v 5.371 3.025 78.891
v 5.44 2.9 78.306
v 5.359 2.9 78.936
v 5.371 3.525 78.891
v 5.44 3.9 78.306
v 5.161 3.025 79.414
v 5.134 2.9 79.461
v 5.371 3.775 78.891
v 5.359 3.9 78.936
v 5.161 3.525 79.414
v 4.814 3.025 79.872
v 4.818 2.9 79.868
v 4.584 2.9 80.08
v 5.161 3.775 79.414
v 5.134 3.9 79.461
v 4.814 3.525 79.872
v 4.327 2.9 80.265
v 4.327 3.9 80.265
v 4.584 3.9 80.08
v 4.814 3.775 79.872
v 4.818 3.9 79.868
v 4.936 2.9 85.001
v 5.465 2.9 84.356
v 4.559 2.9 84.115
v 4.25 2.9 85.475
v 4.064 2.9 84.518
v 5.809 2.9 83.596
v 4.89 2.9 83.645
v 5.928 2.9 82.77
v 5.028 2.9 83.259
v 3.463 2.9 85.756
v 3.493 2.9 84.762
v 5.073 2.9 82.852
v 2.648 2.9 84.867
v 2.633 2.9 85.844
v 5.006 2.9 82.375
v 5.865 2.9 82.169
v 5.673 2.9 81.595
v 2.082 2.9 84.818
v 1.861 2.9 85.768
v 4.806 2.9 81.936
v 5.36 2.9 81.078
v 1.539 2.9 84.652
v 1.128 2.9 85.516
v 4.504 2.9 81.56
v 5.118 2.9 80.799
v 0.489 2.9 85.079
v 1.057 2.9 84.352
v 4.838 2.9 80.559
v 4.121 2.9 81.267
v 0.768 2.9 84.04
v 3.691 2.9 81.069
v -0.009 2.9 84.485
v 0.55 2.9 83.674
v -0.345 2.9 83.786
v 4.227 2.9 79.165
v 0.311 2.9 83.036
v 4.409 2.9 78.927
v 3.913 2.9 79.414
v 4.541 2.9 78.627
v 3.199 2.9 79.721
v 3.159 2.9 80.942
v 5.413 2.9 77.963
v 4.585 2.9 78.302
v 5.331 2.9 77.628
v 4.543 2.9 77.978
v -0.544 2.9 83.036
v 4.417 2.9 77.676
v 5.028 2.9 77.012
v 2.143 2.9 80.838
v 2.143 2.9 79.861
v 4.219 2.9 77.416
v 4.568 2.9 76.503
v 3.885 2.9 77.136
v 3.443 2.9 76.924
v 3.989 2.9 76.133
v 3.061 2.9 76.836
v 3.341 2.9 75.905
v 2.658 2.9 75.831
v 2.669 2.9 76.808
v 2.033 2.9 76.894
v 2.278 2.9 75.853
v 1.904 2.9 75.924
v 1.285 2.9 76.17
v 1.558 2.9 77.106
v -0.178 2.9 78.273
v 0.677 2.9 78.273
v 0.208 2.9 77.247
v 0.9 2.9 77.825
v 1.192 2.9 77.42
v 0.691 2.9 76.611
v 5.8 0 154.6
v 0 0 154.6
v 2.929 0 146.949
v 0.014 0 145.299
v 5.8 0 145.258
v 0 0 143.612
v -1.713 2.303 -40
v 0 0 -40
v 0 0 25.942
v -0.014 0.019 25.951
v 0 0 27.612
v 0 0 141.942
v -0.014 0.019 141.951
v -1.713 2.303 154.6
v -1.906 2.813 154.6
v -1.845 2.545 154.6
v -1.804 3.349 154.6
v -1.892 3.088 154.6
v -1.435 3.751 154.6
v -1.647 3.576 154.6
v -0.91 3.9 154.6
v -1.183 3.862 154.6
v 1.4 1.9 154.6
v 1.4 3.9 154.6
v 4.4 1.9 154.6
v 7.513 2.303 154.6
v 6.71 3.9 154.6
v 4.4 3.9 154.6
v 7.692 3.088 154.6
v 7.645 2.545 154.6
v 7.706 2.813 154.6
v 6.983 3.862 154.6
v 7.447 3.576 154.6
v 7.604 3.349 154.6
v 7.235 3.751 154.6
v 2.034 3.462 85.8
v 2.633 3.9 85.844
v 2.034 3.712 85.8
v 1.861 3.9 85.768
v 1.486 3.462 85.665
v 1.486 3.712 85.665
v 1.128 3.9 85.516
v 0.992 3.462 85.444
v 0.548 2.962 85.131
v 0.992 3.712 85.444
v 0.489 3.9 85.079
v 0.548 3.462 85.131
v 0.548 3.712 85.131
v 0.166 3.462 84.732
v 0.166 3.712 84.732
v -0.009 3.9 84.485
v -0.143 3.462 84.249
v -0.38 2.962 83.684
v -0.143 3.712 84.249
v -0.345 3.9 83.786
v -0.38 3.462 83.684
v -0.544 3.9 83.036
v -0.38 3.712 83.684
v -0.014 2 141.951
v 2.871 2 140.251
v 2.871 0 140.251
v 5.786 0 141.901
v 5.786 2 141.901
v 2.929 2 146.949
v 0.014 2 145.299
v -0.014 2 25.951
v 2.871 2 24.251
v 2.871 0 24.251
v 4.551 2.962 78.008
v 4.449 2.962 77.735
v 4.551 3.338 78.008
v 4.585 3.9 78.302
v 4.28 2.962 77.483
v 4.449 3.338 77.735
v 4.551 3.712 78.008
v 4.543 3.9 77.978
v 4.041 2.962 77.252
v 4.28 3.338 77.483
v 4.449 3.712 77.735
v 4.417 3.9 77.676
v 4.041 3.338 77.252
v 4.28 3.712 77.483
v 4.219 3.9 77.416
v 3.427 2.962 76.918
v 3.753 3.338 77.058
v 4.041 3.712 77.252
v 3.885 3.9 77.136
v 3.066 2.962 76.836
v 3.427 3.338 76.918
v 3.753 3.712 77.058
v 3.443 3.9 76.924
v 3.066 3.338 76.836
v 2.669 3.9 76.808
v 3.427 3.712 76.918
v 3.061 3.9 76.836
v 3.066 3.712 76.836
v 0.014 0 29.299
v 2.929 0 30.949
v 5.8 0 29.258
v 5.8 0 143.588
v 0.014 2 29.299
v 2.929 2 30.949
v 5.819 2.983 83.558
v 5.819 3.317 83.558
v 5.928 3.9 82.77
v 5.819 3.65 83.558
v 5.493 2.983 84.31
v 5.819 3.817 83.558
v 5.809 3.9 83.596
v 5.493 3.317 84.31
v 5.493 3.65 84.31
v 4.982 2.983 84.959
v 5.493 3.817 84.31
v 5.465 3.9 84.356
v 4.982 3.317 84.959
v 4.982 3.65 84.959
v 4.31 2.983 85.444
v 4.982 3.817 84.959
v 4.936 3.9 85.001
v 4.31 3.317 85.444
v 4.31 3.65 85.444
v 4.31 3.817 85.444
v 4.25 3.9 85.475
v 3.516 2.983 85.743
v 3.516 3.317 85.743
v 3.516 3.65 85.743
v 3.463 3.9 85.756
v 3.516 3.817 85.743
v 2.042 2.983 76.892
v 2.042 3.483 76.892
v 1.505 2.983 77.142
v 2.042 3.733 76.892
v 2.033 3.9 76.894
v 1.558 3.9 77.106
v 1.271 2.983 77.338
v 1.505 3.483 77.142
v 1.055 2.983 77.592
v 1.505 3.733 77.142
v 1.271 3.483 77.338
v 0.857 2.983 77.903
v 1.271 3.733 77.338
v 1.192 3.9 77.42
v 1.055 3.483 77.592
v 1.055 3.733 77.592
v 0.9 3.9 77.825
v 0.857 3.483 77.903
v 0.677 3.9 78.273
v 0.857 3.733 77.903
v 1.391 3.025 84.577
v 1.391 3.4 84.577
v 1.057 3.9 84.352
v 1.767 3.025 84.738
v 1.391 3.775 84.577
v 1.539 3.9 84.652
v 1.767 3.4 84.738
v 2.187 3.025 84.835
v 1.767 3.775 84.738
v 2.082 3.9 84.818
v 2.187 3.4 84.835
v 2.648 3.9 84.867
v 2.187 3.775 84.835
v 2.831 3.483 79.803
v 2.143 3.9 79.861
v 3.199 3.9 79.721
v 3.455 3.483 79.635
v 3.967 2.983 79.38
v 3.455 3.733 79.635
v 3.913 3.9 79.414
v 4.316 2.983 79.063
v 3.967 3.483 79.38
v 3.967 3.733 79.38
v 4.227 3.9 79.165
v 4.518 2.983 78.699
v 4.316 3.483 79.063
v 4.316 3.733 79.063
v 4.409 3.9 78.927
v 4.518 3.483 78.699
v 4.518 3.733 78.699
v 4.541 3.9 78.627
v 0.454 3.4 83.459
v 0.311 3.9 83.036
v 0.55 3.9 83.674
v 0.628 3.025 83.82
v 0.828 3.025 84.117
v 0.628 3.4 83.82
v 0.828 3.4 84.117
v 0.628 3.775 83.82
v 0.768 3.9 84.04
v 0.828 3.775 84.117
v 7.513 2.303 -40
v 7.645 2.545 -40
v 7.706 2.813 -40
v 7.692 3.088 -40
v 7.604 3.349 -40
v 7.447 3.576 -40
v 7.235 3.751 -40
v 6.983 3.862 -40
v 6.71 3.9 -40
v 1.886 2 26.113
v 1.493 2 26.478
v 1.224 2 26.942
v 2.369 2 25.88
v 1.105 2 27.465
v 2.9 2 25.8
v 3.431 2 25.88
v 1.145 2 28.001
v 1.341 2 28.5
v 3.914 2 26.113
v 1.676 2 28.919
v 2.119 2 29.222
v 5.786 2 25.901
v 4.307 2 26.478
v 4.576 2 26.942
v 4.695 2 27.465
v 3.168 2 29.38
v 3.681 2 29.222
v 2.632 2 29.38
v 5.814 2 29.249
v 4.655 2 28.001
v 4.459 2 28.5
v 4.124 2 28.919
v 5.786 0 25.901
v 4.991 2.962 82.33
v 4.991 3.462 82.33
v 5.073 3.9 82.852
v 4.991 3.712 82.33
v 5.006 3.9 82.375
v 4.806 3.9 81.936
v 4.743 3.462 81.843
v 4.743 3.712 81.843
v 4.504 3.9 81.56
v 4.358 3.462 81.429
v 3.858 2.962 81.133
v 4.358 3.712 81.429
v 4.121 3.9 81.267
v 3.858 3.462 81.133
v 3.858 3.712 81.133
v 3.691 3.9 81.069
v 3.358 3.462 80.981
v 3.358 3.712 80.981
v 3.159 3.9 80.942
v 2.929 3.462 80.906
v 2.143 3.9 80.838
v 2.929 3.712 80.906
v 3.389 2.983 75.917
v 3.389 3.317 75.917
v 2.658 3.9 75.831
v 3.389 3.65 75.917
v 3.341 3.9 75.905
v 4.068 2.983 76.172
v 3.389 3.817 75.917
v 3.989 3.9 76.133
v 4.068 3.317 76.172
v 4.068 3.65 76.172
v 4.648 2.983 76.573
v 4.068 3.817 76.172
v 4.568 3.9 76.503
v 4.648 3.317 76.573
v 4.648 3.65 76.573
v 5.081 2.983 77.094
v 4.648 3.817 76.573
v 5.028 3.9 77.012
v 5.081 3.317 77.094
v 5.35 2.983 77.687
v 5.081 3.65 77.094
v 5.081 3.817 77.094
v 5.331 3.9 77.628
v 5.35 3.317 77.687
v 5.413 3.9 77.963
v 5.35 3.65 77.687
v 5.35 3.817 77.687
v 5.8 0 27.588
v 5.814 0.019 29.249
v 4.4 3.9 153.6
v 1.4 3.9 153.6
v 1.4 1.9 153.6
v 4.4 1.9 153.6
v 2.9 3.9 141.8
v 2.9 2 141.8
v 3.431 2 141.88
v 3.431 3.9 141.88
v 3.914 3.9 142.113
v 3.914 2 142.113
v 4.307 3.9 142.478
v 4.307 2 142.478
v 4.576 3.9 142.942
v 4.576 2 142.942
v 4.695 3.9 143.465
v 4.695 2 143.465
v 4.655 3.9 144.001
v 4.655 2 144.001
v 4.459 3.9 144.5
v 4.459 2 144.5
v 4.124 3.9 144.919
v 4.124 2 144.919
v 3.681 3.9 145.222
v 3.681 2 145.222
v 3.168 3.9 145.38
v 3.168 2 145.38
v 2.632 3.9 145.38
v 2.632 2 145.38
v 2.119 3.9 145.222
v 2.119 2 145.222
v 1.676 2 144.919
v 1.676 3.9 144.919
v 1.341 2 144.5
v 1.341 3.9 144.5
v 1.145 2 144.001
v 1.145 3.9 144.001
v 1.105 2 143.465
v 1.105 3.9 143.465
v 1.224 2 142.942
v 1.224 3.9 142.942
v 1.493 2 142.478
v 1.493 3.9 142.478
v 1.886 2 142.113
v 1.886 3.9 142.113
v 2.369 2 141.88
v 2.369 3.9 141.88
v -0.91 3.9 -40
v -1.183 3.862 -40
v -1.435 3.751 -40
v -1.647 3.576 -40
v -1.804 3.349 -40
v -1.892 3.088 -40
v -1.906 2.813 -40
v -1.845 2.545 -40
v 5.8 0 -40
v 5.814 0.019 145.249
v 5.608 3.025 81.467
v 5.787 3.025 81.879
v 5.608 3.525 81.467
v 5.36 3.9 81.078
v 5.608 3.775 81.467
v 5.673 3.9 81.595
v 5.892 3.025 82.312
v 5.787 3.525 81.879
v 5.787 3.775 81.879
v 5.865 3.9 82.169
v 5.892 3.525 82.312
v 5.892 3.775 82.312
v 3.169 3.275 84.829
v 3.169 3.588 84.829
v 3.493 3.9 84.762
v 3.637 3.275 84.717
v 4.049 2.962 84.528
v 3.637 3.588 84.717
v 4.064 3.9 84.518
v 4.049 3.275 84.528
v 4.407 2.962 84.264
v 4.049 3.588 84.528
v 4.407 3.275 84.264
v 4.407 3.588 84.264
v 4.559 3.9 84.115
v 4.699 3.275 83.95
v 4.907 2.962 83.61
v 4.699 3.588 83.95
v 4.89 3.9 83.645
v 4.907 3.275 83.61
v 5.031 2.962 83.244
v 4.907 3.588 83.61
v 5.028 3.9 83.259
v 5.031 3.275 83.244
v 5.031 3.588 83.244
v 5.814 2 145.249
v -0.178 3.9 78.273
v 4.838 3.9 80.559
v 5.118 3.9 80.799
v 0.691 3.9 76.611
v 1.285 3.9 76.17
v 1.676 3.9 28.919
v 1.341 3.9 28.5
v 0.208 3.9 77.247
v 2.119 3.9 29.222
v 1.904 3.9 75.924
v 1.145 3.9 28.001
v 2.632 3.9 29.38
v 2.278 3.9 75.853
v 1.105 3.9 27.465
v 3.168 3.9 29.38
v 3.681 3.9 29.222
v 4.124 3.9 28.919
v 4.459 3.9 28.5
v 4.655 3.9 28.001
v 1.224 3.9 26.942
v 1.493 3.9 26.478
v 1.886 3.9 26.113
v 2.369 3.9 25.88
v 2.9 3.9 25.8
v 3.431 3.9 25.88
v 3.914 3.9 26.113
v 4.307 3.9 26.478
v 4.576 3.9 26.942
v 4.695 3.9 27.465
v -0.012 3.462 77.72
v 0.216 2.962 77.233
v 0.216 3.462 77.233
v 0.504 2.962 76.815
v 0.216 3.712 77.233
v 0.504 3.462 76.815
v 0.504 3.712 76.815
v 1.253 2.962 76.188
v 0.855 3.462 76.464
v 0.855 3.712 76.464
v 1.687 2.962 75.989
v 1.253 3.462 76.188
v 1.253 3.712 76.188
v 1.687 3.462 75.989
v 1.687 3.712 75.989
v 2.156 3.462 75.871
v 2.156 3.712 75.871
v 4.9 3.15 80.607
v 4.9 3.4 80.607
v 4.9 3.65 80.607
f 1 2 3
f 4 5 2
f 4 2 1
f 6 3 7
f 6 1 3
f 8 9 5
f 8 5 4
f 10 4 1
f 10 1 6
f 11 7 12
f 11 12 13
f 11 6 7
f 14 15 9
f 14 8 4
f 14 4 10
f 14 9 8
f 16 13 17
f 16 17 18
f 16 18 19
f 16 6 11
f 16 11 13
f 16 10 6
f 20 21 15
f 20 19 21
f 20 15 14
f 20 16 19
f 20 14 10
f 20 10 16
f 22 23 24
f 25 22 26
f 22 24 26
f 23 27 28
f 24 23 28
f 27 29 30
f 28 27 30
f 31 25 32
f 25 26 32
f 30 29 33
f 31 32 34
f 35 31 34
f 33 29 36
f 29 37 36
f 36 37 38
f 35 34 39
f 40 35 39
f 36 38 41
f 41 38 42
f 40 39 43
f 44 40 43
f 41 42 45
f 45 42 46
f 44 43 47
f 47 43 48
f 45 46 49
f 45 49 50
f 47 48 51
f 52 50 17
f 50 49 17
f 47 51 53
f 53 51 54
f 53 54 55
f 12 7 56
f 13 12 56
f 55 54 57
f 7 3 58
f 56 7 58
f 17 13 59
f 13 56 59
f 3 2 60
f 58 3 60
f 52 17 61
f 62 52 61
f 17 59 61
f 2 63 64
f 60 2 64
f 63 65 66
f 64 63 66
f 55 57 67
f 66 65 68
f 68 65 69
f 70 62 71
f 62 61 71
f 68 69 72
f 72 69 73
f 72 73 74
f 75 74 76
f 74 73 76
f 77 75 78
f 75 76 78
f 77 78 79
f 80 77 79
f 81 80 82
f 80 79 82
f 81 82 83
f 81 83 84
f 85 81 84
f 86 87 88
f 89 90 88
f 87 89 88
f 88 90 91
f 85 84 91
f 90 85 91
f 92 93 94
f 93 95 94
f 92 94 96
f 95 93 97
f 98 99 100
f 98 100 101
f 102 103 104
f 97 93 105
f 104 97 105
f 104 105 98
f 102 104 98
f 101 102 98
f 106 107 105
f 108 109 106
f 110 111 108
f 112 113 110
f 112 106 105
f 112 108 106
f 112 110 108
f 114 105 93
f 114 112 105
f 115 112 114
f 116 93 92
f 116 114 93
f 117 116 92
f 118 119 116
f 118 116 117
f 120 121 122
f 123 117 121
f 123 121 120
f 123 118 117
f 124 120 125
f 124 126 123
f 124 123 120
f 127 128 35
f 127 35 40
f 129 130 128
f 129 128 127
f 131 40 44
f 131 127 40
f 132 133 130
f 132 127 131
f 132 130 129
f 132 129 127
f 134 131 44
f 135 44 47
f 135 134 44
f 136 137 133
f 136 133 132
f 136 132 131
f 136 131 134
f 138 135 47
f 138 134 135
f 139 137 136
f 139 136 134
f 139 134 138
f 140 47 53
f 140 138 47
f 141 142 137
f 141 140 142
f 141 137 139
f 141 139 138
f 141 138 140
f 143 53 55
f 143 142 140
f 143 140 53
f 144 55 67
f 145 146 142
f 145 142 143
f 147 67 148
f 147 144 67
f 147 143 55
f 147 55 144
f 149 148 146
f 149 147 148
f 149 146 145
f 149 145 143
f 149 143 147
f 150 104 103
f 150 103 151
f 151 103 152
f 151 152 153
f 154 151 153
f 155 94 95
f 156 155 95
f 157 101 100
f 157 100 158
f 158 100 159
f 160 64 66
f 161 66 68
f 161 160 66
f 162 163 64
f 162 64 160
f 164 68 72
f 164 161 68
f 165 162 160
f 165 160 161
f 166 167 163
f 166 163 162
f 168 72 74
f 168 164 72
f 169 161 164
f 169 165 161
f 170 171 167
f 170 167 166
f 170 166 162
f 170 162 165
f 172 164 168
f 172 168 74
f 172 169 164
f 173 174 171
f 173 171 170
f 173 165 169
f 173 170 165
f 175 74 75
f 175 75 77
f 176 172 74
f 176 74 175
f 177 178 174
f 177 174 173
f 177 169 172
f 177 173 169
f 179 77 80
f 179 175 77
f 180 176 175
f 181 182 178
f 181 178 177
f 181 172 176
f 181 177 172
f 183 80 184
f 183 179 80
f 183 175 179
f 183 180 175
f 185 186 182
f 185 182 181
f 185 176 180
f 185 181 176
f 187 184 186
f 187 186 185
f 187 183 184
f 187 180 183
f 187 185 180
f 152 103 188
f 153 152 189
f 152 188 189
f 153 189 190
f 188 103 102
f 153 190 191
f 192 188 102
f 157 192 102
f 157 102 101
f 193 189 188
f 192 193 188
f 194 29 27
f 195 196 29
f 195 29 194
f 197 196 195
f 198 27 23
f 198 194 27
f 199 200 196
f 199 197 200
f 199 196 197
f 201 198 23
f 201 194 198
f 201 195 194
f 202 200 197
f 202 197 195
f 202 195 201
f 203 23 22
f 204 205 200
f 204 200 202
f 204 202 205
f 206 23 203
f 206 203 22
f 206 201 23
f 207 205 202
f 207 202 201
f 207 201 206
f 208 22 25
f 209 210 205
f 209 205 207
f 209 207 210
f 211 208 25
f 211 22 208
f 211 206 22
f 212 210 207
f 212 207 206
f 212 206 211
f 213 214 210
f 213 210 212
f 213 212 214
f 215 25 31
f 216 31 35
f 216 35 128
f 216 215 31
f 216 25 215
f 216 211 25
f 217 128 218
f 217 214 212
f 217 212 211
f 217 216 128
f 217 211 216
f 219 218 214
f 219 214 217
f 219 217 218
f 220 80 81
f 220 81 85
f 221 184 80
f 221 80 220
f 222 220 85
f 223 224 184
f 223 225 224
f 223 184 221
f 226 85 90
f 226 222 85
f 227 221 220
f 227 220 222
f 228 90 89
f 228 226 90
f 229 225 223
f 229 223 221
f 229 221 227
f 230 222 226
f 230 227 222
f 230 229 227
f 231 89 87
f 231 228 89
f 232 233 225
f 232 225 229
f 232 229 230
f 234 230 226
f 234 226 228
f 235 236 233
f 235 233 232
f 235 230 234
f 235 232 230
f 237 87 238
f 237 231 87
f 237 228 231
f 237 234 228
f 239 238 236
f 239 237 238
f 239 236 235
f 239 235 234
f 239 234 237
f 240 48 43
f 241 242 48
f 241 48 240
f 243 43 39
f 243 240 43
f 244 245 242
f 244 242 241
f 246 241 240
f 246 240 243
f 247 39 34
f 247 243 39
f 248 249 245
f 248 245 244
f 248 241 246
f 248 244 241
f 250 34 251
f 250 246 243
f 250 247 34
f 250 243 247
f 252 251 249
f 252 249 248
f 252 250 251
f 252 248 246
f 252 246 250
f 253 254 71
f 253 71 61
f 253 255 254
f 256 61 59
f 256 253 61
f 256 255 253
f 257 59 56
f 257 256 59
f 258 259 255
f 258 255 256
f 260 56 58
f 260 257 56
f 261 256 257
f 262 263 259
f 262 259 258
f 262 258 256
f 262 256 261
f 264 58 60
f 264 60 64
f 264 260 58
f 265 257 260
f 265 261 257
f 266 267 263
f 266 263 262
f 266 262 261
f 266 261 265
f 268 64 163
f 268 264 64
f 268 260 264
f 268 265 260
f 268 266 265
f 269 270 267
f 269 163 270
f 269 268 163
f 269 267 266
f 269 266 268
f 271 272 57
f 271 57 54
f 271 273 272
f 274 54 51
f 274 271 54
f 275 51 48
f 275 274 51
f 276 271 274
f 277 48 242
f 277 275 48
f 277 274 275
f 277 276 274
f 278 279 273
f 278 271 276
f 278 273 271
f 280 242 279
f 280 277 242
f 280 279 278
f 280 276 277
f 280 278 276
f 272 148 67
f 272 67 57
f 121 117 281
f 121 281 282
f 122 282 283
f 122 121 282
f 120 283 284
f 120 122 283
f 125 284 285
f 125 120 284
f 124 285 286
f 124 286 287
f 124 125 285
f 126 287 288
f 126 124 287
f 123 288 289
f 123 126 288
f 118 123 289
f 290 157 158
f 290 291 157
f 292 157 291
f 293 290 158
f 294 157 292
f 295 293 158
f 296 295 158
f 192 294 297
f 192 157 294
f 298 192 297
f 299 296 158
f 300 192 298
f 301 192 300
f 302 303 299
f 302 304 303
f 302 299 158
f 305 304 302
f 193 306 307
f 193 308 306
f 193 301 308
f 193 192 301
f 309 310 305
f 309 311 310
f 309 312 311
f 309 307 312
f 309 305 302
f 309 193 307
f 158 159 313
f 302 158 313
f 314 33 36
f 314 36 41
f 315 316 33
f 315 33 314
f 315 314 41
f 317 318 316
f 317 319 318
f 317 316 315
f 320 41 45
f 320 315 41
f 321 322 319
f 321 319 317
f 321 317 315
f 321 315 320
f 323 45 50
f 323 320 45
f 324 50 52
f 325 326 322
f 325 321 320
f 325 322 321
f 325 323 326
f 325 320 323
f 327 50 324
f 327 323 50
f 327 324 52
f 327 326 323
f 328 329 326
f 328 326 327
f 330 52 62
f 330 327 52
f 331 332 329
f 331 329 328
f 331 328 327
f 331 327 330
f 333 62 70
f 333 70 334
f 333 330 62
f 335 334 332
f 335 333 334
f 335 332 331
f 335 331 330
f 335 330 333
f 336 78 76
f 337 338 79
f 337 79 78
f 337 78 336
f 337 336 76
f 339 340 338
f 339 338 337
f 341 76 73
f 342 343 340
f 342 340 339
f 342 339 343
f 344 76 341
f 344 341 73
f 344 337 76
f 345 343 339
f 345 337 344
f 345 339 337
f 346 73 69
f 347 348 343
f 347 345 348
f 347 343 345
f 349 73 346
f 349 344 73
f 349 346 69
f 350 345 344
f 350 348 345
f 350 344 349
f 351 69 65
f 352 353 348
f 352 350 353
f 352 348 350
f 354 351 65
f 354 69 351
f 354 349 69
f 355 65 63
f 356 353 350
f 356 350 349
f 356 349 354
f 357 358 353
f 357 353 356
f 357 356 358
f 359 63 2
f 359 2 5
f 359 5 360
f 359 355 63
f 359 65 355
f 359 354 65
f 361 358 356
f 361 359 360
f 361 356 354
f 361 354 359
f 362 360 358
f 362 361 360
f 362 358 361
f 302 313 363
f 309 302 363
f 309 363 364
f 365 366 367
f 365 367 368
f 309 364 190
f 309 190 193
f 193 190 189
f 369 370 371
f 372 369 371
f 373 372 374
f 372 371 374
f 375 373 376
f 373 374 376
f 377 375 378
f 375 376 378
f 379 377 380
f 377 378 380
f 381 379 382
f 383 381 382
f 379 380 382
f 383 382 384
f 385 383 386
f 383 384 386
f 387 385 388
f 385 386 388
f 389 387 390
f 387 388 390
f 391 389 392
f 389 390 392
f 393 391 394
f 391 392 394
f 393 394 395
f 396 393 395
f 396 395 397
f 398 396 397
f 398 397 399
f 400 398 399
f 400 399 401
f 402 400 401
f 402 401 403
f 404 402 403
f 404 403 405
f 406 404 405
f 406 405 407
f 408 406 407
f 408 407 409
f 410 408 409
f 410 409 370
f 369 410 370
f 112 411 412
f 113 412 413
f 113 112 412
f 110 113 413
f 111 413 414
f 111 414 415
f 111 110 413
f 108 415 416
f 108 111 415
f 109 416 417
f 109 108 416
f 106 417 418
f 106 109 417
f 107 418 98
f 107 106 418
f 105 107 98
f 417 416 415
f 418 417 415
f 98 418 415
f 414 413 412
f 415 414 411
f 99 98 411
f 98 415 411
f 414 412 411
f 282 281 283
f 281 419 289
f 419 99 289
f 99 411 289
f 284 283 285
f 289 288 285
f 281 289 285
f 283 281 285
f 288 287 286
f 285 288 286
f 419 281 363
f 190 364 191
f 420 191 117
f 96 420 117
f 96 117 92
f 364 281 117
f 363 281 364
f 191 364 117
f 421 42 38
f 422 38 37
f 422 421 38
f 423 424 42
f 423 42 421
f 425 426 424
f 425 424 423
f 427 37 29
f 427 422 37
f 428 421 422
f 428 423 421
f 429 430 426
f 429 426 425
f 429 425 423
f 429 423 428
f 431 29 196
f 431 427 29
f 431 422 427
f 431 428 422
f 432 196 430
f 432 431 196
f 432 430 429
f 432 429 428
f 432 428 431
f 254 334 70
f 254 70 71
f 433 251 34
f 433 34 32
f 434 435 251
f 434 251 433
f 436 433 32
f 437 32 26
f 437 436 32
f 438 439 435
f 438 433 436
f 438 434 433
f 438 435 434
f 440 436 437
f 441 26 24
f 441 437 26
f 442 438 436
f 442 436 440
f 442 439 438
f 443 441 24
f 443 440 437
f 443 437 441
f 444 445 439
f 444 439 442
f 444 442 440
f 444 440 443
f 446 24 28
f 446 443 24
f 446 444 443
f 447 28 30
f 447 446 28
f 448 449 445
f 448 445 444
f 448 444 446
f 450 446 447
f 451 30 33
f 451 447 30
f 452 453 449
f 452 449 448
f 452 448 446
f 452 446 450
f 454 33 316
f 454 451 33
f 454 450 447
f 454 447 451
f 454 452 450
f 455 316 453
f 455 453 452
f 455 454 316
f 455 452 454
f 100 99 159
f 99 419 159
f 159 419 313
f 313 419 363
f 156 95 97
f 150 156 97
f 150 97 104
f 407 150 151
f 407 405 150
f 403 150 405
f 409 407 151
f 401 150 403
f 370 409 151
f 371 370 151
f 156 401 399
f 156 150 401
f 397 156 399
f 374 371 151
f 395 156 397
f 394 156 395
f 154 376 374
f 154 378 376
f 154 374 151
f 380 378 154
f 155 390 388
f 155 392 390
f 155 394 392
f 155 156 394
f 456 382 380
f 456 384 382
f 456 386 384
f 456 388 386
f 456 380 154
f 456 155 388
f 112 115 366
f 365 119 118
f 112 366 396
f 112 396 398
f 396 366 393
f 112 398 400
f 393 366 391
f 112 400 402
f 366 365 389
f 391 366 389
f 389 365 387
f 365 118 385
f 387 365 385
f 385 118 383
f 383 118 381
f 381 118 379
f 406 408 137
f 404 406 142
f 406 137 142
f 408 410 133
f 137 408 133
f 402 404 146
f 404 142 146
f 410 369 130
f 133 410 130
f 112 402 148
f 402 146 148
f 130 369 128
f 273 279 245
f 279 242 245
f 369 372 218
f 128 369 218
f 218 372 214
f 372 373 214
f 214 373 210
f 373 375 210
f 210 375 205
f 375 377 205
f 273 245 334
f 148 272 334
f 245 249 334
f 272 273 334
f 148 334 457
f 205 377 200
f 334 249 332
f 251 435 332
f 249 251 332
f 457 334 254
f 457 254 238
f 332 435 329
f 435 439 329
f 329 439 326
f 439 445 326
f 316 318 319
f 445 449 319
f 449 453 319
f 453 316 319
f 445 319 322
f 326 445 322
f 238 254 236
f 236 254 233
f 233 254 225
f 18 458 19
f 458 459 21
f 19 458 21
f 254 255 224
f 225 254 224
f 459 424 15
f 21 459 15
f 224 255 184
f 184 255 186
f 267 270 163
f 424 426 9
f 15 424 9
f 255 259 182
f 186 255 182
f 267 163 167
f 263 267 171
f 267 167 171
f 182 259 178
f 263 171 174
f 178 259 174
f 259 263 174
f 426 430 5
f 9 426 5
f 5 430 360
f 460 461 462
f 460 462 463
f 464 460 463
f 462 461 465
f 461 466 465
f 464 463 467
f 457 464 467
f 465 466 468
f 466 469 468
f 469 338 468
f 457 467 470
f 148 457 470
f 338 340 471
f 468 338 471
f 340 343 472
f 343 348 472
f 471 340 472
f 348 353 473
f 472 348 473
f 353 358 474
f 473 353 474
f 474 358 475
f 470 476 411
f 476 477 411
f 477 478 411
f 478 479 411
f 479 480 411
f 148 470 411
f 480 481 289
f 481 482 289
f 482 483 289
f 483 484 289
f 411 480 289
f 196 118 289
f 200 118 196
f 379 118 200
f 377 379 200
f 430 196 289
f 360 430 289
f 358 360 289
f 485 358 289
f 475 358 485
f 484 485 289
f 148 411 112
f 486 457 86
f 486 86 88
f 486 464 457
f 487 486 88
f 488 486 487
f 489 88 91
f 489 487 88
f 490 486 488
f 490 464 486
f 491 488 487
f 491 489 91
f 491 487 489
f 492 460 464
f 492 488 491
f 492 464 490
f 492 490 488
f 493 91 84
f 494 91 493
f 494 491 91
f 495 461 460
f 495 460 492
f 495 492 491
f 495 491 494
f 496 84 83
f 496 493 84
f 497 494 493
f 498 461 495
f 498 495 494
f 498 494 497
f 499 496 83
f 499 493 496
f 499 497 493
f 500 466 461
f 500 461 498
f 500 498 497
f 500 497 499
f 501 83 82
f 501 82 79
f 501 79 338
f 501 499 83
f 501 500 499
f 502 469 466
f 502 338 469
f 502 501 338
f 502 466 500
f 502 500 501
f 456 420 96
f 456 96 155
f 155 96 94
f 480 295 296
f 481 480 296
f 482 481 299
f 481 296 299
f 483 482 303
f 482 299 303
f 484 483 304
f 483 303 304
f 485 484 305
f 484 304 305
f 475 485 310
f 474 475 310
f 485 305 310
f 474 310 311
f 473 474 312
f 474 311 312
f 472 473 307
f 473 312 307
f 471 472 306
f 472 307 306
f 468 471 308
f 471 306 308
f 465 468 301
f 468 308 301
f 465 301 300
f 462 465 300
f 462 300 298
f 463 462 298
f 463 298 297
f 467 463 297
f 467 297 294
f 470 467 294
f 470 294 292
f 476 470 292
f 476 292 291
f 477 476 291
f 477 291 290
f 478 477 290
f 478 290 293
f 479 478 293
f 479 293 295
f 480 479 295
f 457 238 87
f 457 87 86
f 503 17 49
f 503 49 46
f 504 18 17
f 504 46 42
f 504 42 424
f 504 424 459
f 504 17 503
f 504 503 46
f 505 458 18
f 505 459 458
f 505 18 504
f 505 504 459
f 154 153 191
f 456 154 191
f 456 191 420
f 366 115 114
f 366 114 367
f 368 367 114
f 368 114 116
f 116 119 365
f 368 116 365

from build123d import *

# Parameters (mm, degrees)
BOSS_EXTRUDE1_DEPTH = 171.2
FILLET1_R           = 1
SKETCH2_R           = 1.8
CUT_EXTRUDE1_DEPTH  = 200
CUT_EXTRUDE2_DEPTH  = 2
LPATTERN1_COUNT     = 3
LPATTERN1_PITCH     = 116
CUT_EXTRUDE3_DEPTH  = 1
SKETCH5_W           = 10.598271306
SKETCH5_H           = 4.806690724
CUT_EXTRUDE4_DEPTH  = 16.6
SKETCH6_W           = 3
SKETCH6_H           = 2
CUT_EXTRUDE5_DEPTH  = 2
THICKEN1_T1         = 40


with BuildPart() as part:
    # Sketch1 → Boss-Extrude1 (new body)
    with BuildSketch(Plane.XY):
        Polygon((0, 0), (5.8, 0), (8.7, 3.9), (-2.9, 3.9), align=None)
    extrude(amount=BOSS_EXTRUDE1_DEPTH)

    # Fillet1
    fillet1_edges = [part.edges().sort_by_distance(p)[0] for p in [
        (-2.9, 3.9, 85.6),
        (8.7, 3.9, 85.6),
    ]]
    fillet(fillet1_edges, radius=FILLET1_R)

    # Sketch2 → Cut-Extrude1 (cut)
    with BuildSketch(Plane.XZ):
        with Locations(Location((2.9, 143.6, 0), (0, 0, 270))):
            Circle(SKETCH2_R)
    cut_extrude1 = extrude(amount=-CUT_EXTRUDE1_DEPTH, mode=Mode.SUBTRACT)

    # Sketch3 → Cut-Extrude2 (cut)
    with BuildSketch(Plane.XZ):
        Polygon((2.92874321, 146.948508199), (0.01447844, 145.29914645), (-0.014264771, 141.950638251), (2.87125679, 140.251491801), (5.78552156, 141.90085355), (5.814264771, 145.249361749), align=None)
    cut_extrude2 = extrude(amount=-CUT_EXTRUDE2_DEPTH, mode=Mode.SUBTRACT)

    # LPattern1: Cut-Extrude1, Cut-Extrude2 ×3
    with Locations(*[(0, 0, -i * LPATTERN1_PITCH) for i in range(1, LPATTERN1_COUNT)]):
        add(cut_extrude1, mode=Mode.SUBTRACT)
        add(cut_extrude2, mode=Mode.SUBTRACT)

    # Sketch4 → Cut-Extrude3 (cut)
    with BuildSketch(Plane(origin=(0, 3.9, 0), x_dir=(1, 0, 0), z_dir=(0, 1, 0))):
        with BuildLine():
            Line((0.677254142, -78.273076923), (-0.177553551, -78.273076923))
            add(Edge.make_bspline(
                [(-0.177553551, -78.273076923), (-0.154395416, -78.177194235), (-0.109123158, -77.989751421), (-0.01469619, -77.72194309), (0.088171783, -77.468514078), (0.211694989, -77.234209763), (0.346429527, -77.014321321), (0.500796362, -76.81383606), (0.667673607, -76.627655062), (0.852254362, -76.462428322), (1.045825934, -76.312810359), (1.251115864, -76.185243239), (1.463993881, -76.075503937), (1.685934908, -75.985097449), (1.917599703, -75.916992274), (2.156893893, -75.867579824), (2.404444561, -75.835491149), (2.572486218, -75.83235943), (2.657813036, -75.830769231)],
                knots=[0, 0, 0, 0, 1.162005537, 2.271625781, 3.343758855, 4.383309926, 5.390229558, 6.379919256, 7.361854164, 8.333198761, 9.295911338, 10.242430842, 11.177959212, 12.116337295, 13.062827104, 14.020064771, 14.994644689, 16, 16, 16, 16], degree=3))
            add(Edge.make_bspline(
                [(2.657813036, -75.830769231), (2.782135355, -75.834522707), (3.028068164, -75.841947786), (3.389373313, -75.909750646), (3.737789156, -76.017043327), (4.069502038, -76.165289685), (4.377617915, -76.348135158), (4.651764252, -76.565753478), (4.888225128, -76.813945863), (5.08660197, -77.088082341), (5.241927503, -77.381059121), (5.356462562, -77.682593834), (5.426190137, -77.991971199), (5.435226795, -78.200860651), (5.439754142, -78.305513822)],
                knots=[0, 0, 0, 0, 1.083050992, 2.142477498, 3.193116406, 4.255571735, 5.30263384, 6.308962982, 7.297363603, 8.282367274, 9.249857812, 10.179914175, 11.08814088, 12, 12, 12, 12], degree=3))
            add(Edge.make_bspline(
                [(5.439754142, -78.305513822), (5.436587512, -78.406225171), (5.430390908, -78.603301651), (5.37777561, -78.891015154), (5.289230494, -79.162182652), (5.166576355, -79.417945672), (5.007803993, -79.656682557), (4.815473296, -79.878930446), (4.588226767, -80.085675083), (4.416017657, -80.20411022), (4.32735931, -80.265084135)],
                knots=[0, 0, 0, 0, 1.024540389, 2.004866551, 2.965041327, 3.920577974, 4.882998113, 5.874504559, 6.905732034, 8, 8, 8, 8], degree=3))
            add(Edge.make_bspline(
                [(4.32735931, -80.265084135), (4.42868287, -80.314010444), (4.62943415, -80.410947615), (4.903075234, -80.601055069), (5.151481452, -80.820555557), (5.290012287, -80.991849491), (5.35961592, -81.077914663)],
                knots=[0, 0, 0, 0, 1.015518401, 2.012035669, 3.001164323, 4, 4, 4, 4], degree=3))
            add(Edge.make_bspline(
                [(5.35961592, -81.077914663), (5.405448431, -81.140664687), (5.496362912, -81.26513716), (5.608582472, -81.465261291), (5.710388704, -81.667603558), (5.789718944, -81.87758737), (5.85115211, -82.092778929), (5.895065169, -82.313547735), (5.922345153, -82.540074068), (5.926251905, -82.69332446), (5.92821568, -82.770357572)],
                knots=[0, 0, 0, 0, 1.025084078, 2.033381695, 3.024893161, 4.013698104, 4.991890475, 5.976764909, 6.982997093, 8, 8, 8, 8], degree=3))
            add(Edge.make_bspline(
                [(5.92821568, -82.770357572), (5.92333204, -82.903734028), (5.913587741, -83.169859267), (5.826490939, -83.563036902), (5.691472048, -83.947372019), (5.49972853, -84.314968546), (5.266046238, -84.658903726), (4.988032377, -84.966632824), (4.668845794, -85.231151883), (4.312867564, -85.452159718), (3.927194522, -85.628829206), (3.514692375, -85.751449818), (3.081304728, -85.83131286), (2.784104868, -85.839876839), (2.633008348, -85.844230769)],
                knots=[0, 0, 0, 0, 0.955779014, 1.907060117, 2.875433937, 3.871313158, 4.872415639, 5.851225146, 6.836215519, 7.83643374, 8.849228613, 9.86973379, 10.916971861, 12, 12, 12, 12], degree=3))
            add(Edge.make_bspline(
                [(2.633008348, -85.844230769), (2.531174395, -85.841867989), (2.330799134, -85.837218825), (2.036222185, -85.805436346), (1.75503956, -85.74738826), (1.486871083, -85.669274265), (1.231478519, -85.570236738), (0.989641205, -85.446905139), (0.75987128, -85.301821694), (0.544336992, -85.133273858), (0.343064032, -84.944729641), (0.161401262, -84.732841907), (-0.003680032, -84.501527543), (-0.147759642, -84.248099797), (-0.277400206, -83.975833776), (-0.384028381, -83.68124322), (-0.477878392, -83.366961703), (-0.52151232, -83.147947281), (-0.543899705, -83.035576923)],
                knots=[0, 0, 0, 0, 1.048658725, 2.063410685, 3.046034179, 4.001477787, 4.936774919, 5.862367409, 6.792675028, 7.730719943, 8.675894397, 9.627829632, 10.600096036, 11.597688215, 12.626045268, 13.701542398, 14.82072376, 16, 16, 16, 16], degree=3))
            Line((-0.543899705, -83.035576923), (0.310907988, -83.035576923))
            add(Edge.make_bspline(
                [(0.310907988, -83.035576923), (0.333178231, -83.108916738), (0.376495788, -83.251569048), (0.450230985, -83.456874451), (0.534236783, -83.645083153), (0.624355689, -83.817575792), (0.719002745, -83.976051116), (0.824906934, -84.116318631), (0.934224394, -84.244539288), (1.016627491, -84.316778554), (1.056956666, -84.352133413)],
                knots=[0, 0, 0, 0, 1.198163088, 2.33053128, 3.407730985, 4.417276592, 5.372219308, 6.28897303, 7.162600585, 8, 8, 8, 8], degree=3))
            add(Edge.make_bspline(
                [(1.056956666, -84.352133413), (1.110287349, -84.393249665), (1.216784096, -84.475355251), (1.390324782, -84.580134683), (1.572837079, -84.670924331), (1.768275585, -84.740276389), (1.972422925, -84.798998451), (2.188578826, -84.837426435), (2.414836267, -84.863792102), (2.56932568, -84.866118737), (2.648272771, -84.867307692)],
                knots=[0, 0, 0, 0, 0.946170439, 1.889420265, 2.845303464, 3.807233317, 4.801018734, 5.828864929, 6.890507805, 8, 8, 8, 8], degree=3))
            add(Edge.make_bspline(
                [(2.648272771, -84.867307692), (2.737409089, -84.86563155), (2.911707464, -84.862353999), (3.166038188, -84.832212254), (3.407993456, -84.788314486), (3.634886919, -84.720515583), (3.849690657, -84.636747694), (4.049393574, -84.531568819), (4.236617263, -84.408166398), (4.408963717, -84.267906259), (4.563936848, -84.114359191), (4.700387952, -83.953759333), (4.816387923, -83.786783825), (4.909960376, -83.612508653), (4.983848659, -83.431655495), (5.034149369, -83.243716823), (5.069123849, -83.050230692), (5.07197213, -82.918706855), (5.073407988, -82.852403846)],
                knots=[0, 0, 0, 0, 1.217147791, 2.380027433, 3.494444702, 4.572153297, 5.609568379, 6.639424714, 7.649109417, 8.668170816, 9.669597737, 10.625200337, 11.543417969, 12.441394052, 13.322311151, 14.205496177, 15.095365482, 16, 16, 16, 16], degree=3))
            add(Edge.make_bspline(
                [(5.073407988, -82.852403846), (5.069243381, -82.763654417), (5.060934891, -82.586597163), (4.997502257, -82.326108621), (4.893165777, -82.075129192), (4.747099871, -81.837940935), (4.569293352, -81.618115088), (4.361471713, -81.421977697), (4.121909177, -81.260134092), (3.901419391, -81.148314248), (3.706115643, -81.072013351), (3.538978061, -81.021190769), (3.351861877, -80.978155035), (3.147029884, -80.938116639), (2.922938702, -80.904040684), (2.679832296, -80.875624028), (2.417661402, -80.852886381), (2.236166158, -80.842732472), (2.142638757, -80.8375)],
                knots=[0, 0, 0, 0, 1.07054697, 2.135767047, 3.216561865, 4.33974944, 5.486079747, 6.621378074, 7.775625952, 8.963672916, 9.598146892, 10.304877434, 11.070270905, 11.915000392, 12.823868403, 13.805723172, 14.86925407, 16, 16, 16, 16], degree=3))
            Line((2.142638757, -80.8375), (2.142638757, -79.860576923))
            add(Edge.make_bspline(
                [(2.142638757, -79.860576923), (2.260479787, -79.858577207), (2.491301415, -79.854660255), (2.828470916, -79.807285598), (3.150887573, -79.741751889), (3.451406063, -79.641371473), (3.725314348, -79.524784665), (3.962948408, -79.389115438), (4.160979001, -79.238308156), (4.318443774, -79.070035126), (4.436905461, -78.889563461), (4.523519817, -78.701467414), (4.574683562, -78.504098363), (4.581513441, -78.369402159), (4.584946449, -78.301697716)],
                knots=[0, 0, 0, 0, 1.321986639, 2.589447074, 3.816329219, 5.01088745, 6.139805852, 7.153945165, 8.075214402, 8.924034688, 9.728124013, 10.488707548, 11.240355623, 12, 12, 12, 12], degree=3))
            add(Edge.make_bspline(
                [(4.584946449, -78.301697716), (4.583818659, -78.251956138), (4.581574975, -78.152997628), (4.553279526, -78.008421549), (4.510759815, -77.868265403), (4.452304266, -77.733125219), (4.374062653, -77.60393826), (4.280429219, -77.479603131), (4.16893746, -77.360829704), (4.041178779, -77.25012112), (3.903986653, -77.14461341), (3.753628337, -77.055041298), (3.594637377, -76.978446522), (3.426837753, -76.91528352), (3.249684916, -76.867769314), (3.064011213, -76.833653917), (2.869462589, -76.812324299), (2.736733804, -76.809253396), (2.669261353, -76.807692308)],
                knots=[0, 0, 0, 0, 0.884392785, 1.759457502, 2.611959086, 3.489218968, 4.37281399, 5.2945488, 6.255912374, 7.266815255, 8.301784654, 9.332968512, 10.37626691, 11.440494194, 12.520033166, 13.637162961, 14.798855837, 16, 16, 16, 16], degree=3))
            add(Edge.make_bspline(
                [(2.669261353, -76.807692308), (2.560807885, -76.8114788), (2.348973038, -76.8188747), (2.043588157, -76.883652901), (1.759690541, -76.987007543), (1.542687455, -77.110378117), (1.382442736, -77.232163226), (1.267933354, -77.338523149), (1.155482536, -77.456722476), (1.05248823, -77.59404134), (0.948328336, -77.741180248), (0.853501351, -77.905618981), (0.761354617, -78.083068083), (0.705830536, -78.20851406), (0.677254142, -78.273076923)],
                knots=[0, 0, 0, 0, 1.472543308, 2.876219568, 4.221790263, 5.565193594, 6.249813518, 6.953379497, 7.687249741, 8.463570142, 9.283606569, 10.136032583, 11.040678096, 12, 12, 12, 12], degree=3))
        make_face()
    extrude(amount=-CUT_EXTRUDE3_DEPTH, mode=Mode.SUBTRACT)

    # Sketch5 → Cut-Extrude4 (cut)
    with BuildSketch(Plane.XY.offset(171.2)):
        with Locations((3.01775857, 2.046347921)):
            Rectangle(SKETCH5_W, SKETCH5_H)
    extrude(amount=-CUT_EXTRUDE4_DEPTH, mode=Mode.SUBTRACT)

    # Sketch6 → Cut-Extrude5 (cut)
    with BuildSketch(Plane(origin=(0, 3.9, 0), x_dir=(1, 0, 0), z_dir=(0, 1, 0))):
        with Locations((2.9, -154.6)):
            Rectangle(SKETCH6_W, SKETCH6_H)
    extrude(amount=-CUT_EXTRUDE5_DEPTH, mode=Mode.SUBTRACT)

    # Surface-Offset1: a surface, a copy of 1 face of the part
    surface_offset1_1 = part.part.faces().sort_by_distance((2.9, 2.093393293, 0))[0]
    add(Solid.thicken(surface_offset1_1, THICKEN1_T1))


solid = part.part
